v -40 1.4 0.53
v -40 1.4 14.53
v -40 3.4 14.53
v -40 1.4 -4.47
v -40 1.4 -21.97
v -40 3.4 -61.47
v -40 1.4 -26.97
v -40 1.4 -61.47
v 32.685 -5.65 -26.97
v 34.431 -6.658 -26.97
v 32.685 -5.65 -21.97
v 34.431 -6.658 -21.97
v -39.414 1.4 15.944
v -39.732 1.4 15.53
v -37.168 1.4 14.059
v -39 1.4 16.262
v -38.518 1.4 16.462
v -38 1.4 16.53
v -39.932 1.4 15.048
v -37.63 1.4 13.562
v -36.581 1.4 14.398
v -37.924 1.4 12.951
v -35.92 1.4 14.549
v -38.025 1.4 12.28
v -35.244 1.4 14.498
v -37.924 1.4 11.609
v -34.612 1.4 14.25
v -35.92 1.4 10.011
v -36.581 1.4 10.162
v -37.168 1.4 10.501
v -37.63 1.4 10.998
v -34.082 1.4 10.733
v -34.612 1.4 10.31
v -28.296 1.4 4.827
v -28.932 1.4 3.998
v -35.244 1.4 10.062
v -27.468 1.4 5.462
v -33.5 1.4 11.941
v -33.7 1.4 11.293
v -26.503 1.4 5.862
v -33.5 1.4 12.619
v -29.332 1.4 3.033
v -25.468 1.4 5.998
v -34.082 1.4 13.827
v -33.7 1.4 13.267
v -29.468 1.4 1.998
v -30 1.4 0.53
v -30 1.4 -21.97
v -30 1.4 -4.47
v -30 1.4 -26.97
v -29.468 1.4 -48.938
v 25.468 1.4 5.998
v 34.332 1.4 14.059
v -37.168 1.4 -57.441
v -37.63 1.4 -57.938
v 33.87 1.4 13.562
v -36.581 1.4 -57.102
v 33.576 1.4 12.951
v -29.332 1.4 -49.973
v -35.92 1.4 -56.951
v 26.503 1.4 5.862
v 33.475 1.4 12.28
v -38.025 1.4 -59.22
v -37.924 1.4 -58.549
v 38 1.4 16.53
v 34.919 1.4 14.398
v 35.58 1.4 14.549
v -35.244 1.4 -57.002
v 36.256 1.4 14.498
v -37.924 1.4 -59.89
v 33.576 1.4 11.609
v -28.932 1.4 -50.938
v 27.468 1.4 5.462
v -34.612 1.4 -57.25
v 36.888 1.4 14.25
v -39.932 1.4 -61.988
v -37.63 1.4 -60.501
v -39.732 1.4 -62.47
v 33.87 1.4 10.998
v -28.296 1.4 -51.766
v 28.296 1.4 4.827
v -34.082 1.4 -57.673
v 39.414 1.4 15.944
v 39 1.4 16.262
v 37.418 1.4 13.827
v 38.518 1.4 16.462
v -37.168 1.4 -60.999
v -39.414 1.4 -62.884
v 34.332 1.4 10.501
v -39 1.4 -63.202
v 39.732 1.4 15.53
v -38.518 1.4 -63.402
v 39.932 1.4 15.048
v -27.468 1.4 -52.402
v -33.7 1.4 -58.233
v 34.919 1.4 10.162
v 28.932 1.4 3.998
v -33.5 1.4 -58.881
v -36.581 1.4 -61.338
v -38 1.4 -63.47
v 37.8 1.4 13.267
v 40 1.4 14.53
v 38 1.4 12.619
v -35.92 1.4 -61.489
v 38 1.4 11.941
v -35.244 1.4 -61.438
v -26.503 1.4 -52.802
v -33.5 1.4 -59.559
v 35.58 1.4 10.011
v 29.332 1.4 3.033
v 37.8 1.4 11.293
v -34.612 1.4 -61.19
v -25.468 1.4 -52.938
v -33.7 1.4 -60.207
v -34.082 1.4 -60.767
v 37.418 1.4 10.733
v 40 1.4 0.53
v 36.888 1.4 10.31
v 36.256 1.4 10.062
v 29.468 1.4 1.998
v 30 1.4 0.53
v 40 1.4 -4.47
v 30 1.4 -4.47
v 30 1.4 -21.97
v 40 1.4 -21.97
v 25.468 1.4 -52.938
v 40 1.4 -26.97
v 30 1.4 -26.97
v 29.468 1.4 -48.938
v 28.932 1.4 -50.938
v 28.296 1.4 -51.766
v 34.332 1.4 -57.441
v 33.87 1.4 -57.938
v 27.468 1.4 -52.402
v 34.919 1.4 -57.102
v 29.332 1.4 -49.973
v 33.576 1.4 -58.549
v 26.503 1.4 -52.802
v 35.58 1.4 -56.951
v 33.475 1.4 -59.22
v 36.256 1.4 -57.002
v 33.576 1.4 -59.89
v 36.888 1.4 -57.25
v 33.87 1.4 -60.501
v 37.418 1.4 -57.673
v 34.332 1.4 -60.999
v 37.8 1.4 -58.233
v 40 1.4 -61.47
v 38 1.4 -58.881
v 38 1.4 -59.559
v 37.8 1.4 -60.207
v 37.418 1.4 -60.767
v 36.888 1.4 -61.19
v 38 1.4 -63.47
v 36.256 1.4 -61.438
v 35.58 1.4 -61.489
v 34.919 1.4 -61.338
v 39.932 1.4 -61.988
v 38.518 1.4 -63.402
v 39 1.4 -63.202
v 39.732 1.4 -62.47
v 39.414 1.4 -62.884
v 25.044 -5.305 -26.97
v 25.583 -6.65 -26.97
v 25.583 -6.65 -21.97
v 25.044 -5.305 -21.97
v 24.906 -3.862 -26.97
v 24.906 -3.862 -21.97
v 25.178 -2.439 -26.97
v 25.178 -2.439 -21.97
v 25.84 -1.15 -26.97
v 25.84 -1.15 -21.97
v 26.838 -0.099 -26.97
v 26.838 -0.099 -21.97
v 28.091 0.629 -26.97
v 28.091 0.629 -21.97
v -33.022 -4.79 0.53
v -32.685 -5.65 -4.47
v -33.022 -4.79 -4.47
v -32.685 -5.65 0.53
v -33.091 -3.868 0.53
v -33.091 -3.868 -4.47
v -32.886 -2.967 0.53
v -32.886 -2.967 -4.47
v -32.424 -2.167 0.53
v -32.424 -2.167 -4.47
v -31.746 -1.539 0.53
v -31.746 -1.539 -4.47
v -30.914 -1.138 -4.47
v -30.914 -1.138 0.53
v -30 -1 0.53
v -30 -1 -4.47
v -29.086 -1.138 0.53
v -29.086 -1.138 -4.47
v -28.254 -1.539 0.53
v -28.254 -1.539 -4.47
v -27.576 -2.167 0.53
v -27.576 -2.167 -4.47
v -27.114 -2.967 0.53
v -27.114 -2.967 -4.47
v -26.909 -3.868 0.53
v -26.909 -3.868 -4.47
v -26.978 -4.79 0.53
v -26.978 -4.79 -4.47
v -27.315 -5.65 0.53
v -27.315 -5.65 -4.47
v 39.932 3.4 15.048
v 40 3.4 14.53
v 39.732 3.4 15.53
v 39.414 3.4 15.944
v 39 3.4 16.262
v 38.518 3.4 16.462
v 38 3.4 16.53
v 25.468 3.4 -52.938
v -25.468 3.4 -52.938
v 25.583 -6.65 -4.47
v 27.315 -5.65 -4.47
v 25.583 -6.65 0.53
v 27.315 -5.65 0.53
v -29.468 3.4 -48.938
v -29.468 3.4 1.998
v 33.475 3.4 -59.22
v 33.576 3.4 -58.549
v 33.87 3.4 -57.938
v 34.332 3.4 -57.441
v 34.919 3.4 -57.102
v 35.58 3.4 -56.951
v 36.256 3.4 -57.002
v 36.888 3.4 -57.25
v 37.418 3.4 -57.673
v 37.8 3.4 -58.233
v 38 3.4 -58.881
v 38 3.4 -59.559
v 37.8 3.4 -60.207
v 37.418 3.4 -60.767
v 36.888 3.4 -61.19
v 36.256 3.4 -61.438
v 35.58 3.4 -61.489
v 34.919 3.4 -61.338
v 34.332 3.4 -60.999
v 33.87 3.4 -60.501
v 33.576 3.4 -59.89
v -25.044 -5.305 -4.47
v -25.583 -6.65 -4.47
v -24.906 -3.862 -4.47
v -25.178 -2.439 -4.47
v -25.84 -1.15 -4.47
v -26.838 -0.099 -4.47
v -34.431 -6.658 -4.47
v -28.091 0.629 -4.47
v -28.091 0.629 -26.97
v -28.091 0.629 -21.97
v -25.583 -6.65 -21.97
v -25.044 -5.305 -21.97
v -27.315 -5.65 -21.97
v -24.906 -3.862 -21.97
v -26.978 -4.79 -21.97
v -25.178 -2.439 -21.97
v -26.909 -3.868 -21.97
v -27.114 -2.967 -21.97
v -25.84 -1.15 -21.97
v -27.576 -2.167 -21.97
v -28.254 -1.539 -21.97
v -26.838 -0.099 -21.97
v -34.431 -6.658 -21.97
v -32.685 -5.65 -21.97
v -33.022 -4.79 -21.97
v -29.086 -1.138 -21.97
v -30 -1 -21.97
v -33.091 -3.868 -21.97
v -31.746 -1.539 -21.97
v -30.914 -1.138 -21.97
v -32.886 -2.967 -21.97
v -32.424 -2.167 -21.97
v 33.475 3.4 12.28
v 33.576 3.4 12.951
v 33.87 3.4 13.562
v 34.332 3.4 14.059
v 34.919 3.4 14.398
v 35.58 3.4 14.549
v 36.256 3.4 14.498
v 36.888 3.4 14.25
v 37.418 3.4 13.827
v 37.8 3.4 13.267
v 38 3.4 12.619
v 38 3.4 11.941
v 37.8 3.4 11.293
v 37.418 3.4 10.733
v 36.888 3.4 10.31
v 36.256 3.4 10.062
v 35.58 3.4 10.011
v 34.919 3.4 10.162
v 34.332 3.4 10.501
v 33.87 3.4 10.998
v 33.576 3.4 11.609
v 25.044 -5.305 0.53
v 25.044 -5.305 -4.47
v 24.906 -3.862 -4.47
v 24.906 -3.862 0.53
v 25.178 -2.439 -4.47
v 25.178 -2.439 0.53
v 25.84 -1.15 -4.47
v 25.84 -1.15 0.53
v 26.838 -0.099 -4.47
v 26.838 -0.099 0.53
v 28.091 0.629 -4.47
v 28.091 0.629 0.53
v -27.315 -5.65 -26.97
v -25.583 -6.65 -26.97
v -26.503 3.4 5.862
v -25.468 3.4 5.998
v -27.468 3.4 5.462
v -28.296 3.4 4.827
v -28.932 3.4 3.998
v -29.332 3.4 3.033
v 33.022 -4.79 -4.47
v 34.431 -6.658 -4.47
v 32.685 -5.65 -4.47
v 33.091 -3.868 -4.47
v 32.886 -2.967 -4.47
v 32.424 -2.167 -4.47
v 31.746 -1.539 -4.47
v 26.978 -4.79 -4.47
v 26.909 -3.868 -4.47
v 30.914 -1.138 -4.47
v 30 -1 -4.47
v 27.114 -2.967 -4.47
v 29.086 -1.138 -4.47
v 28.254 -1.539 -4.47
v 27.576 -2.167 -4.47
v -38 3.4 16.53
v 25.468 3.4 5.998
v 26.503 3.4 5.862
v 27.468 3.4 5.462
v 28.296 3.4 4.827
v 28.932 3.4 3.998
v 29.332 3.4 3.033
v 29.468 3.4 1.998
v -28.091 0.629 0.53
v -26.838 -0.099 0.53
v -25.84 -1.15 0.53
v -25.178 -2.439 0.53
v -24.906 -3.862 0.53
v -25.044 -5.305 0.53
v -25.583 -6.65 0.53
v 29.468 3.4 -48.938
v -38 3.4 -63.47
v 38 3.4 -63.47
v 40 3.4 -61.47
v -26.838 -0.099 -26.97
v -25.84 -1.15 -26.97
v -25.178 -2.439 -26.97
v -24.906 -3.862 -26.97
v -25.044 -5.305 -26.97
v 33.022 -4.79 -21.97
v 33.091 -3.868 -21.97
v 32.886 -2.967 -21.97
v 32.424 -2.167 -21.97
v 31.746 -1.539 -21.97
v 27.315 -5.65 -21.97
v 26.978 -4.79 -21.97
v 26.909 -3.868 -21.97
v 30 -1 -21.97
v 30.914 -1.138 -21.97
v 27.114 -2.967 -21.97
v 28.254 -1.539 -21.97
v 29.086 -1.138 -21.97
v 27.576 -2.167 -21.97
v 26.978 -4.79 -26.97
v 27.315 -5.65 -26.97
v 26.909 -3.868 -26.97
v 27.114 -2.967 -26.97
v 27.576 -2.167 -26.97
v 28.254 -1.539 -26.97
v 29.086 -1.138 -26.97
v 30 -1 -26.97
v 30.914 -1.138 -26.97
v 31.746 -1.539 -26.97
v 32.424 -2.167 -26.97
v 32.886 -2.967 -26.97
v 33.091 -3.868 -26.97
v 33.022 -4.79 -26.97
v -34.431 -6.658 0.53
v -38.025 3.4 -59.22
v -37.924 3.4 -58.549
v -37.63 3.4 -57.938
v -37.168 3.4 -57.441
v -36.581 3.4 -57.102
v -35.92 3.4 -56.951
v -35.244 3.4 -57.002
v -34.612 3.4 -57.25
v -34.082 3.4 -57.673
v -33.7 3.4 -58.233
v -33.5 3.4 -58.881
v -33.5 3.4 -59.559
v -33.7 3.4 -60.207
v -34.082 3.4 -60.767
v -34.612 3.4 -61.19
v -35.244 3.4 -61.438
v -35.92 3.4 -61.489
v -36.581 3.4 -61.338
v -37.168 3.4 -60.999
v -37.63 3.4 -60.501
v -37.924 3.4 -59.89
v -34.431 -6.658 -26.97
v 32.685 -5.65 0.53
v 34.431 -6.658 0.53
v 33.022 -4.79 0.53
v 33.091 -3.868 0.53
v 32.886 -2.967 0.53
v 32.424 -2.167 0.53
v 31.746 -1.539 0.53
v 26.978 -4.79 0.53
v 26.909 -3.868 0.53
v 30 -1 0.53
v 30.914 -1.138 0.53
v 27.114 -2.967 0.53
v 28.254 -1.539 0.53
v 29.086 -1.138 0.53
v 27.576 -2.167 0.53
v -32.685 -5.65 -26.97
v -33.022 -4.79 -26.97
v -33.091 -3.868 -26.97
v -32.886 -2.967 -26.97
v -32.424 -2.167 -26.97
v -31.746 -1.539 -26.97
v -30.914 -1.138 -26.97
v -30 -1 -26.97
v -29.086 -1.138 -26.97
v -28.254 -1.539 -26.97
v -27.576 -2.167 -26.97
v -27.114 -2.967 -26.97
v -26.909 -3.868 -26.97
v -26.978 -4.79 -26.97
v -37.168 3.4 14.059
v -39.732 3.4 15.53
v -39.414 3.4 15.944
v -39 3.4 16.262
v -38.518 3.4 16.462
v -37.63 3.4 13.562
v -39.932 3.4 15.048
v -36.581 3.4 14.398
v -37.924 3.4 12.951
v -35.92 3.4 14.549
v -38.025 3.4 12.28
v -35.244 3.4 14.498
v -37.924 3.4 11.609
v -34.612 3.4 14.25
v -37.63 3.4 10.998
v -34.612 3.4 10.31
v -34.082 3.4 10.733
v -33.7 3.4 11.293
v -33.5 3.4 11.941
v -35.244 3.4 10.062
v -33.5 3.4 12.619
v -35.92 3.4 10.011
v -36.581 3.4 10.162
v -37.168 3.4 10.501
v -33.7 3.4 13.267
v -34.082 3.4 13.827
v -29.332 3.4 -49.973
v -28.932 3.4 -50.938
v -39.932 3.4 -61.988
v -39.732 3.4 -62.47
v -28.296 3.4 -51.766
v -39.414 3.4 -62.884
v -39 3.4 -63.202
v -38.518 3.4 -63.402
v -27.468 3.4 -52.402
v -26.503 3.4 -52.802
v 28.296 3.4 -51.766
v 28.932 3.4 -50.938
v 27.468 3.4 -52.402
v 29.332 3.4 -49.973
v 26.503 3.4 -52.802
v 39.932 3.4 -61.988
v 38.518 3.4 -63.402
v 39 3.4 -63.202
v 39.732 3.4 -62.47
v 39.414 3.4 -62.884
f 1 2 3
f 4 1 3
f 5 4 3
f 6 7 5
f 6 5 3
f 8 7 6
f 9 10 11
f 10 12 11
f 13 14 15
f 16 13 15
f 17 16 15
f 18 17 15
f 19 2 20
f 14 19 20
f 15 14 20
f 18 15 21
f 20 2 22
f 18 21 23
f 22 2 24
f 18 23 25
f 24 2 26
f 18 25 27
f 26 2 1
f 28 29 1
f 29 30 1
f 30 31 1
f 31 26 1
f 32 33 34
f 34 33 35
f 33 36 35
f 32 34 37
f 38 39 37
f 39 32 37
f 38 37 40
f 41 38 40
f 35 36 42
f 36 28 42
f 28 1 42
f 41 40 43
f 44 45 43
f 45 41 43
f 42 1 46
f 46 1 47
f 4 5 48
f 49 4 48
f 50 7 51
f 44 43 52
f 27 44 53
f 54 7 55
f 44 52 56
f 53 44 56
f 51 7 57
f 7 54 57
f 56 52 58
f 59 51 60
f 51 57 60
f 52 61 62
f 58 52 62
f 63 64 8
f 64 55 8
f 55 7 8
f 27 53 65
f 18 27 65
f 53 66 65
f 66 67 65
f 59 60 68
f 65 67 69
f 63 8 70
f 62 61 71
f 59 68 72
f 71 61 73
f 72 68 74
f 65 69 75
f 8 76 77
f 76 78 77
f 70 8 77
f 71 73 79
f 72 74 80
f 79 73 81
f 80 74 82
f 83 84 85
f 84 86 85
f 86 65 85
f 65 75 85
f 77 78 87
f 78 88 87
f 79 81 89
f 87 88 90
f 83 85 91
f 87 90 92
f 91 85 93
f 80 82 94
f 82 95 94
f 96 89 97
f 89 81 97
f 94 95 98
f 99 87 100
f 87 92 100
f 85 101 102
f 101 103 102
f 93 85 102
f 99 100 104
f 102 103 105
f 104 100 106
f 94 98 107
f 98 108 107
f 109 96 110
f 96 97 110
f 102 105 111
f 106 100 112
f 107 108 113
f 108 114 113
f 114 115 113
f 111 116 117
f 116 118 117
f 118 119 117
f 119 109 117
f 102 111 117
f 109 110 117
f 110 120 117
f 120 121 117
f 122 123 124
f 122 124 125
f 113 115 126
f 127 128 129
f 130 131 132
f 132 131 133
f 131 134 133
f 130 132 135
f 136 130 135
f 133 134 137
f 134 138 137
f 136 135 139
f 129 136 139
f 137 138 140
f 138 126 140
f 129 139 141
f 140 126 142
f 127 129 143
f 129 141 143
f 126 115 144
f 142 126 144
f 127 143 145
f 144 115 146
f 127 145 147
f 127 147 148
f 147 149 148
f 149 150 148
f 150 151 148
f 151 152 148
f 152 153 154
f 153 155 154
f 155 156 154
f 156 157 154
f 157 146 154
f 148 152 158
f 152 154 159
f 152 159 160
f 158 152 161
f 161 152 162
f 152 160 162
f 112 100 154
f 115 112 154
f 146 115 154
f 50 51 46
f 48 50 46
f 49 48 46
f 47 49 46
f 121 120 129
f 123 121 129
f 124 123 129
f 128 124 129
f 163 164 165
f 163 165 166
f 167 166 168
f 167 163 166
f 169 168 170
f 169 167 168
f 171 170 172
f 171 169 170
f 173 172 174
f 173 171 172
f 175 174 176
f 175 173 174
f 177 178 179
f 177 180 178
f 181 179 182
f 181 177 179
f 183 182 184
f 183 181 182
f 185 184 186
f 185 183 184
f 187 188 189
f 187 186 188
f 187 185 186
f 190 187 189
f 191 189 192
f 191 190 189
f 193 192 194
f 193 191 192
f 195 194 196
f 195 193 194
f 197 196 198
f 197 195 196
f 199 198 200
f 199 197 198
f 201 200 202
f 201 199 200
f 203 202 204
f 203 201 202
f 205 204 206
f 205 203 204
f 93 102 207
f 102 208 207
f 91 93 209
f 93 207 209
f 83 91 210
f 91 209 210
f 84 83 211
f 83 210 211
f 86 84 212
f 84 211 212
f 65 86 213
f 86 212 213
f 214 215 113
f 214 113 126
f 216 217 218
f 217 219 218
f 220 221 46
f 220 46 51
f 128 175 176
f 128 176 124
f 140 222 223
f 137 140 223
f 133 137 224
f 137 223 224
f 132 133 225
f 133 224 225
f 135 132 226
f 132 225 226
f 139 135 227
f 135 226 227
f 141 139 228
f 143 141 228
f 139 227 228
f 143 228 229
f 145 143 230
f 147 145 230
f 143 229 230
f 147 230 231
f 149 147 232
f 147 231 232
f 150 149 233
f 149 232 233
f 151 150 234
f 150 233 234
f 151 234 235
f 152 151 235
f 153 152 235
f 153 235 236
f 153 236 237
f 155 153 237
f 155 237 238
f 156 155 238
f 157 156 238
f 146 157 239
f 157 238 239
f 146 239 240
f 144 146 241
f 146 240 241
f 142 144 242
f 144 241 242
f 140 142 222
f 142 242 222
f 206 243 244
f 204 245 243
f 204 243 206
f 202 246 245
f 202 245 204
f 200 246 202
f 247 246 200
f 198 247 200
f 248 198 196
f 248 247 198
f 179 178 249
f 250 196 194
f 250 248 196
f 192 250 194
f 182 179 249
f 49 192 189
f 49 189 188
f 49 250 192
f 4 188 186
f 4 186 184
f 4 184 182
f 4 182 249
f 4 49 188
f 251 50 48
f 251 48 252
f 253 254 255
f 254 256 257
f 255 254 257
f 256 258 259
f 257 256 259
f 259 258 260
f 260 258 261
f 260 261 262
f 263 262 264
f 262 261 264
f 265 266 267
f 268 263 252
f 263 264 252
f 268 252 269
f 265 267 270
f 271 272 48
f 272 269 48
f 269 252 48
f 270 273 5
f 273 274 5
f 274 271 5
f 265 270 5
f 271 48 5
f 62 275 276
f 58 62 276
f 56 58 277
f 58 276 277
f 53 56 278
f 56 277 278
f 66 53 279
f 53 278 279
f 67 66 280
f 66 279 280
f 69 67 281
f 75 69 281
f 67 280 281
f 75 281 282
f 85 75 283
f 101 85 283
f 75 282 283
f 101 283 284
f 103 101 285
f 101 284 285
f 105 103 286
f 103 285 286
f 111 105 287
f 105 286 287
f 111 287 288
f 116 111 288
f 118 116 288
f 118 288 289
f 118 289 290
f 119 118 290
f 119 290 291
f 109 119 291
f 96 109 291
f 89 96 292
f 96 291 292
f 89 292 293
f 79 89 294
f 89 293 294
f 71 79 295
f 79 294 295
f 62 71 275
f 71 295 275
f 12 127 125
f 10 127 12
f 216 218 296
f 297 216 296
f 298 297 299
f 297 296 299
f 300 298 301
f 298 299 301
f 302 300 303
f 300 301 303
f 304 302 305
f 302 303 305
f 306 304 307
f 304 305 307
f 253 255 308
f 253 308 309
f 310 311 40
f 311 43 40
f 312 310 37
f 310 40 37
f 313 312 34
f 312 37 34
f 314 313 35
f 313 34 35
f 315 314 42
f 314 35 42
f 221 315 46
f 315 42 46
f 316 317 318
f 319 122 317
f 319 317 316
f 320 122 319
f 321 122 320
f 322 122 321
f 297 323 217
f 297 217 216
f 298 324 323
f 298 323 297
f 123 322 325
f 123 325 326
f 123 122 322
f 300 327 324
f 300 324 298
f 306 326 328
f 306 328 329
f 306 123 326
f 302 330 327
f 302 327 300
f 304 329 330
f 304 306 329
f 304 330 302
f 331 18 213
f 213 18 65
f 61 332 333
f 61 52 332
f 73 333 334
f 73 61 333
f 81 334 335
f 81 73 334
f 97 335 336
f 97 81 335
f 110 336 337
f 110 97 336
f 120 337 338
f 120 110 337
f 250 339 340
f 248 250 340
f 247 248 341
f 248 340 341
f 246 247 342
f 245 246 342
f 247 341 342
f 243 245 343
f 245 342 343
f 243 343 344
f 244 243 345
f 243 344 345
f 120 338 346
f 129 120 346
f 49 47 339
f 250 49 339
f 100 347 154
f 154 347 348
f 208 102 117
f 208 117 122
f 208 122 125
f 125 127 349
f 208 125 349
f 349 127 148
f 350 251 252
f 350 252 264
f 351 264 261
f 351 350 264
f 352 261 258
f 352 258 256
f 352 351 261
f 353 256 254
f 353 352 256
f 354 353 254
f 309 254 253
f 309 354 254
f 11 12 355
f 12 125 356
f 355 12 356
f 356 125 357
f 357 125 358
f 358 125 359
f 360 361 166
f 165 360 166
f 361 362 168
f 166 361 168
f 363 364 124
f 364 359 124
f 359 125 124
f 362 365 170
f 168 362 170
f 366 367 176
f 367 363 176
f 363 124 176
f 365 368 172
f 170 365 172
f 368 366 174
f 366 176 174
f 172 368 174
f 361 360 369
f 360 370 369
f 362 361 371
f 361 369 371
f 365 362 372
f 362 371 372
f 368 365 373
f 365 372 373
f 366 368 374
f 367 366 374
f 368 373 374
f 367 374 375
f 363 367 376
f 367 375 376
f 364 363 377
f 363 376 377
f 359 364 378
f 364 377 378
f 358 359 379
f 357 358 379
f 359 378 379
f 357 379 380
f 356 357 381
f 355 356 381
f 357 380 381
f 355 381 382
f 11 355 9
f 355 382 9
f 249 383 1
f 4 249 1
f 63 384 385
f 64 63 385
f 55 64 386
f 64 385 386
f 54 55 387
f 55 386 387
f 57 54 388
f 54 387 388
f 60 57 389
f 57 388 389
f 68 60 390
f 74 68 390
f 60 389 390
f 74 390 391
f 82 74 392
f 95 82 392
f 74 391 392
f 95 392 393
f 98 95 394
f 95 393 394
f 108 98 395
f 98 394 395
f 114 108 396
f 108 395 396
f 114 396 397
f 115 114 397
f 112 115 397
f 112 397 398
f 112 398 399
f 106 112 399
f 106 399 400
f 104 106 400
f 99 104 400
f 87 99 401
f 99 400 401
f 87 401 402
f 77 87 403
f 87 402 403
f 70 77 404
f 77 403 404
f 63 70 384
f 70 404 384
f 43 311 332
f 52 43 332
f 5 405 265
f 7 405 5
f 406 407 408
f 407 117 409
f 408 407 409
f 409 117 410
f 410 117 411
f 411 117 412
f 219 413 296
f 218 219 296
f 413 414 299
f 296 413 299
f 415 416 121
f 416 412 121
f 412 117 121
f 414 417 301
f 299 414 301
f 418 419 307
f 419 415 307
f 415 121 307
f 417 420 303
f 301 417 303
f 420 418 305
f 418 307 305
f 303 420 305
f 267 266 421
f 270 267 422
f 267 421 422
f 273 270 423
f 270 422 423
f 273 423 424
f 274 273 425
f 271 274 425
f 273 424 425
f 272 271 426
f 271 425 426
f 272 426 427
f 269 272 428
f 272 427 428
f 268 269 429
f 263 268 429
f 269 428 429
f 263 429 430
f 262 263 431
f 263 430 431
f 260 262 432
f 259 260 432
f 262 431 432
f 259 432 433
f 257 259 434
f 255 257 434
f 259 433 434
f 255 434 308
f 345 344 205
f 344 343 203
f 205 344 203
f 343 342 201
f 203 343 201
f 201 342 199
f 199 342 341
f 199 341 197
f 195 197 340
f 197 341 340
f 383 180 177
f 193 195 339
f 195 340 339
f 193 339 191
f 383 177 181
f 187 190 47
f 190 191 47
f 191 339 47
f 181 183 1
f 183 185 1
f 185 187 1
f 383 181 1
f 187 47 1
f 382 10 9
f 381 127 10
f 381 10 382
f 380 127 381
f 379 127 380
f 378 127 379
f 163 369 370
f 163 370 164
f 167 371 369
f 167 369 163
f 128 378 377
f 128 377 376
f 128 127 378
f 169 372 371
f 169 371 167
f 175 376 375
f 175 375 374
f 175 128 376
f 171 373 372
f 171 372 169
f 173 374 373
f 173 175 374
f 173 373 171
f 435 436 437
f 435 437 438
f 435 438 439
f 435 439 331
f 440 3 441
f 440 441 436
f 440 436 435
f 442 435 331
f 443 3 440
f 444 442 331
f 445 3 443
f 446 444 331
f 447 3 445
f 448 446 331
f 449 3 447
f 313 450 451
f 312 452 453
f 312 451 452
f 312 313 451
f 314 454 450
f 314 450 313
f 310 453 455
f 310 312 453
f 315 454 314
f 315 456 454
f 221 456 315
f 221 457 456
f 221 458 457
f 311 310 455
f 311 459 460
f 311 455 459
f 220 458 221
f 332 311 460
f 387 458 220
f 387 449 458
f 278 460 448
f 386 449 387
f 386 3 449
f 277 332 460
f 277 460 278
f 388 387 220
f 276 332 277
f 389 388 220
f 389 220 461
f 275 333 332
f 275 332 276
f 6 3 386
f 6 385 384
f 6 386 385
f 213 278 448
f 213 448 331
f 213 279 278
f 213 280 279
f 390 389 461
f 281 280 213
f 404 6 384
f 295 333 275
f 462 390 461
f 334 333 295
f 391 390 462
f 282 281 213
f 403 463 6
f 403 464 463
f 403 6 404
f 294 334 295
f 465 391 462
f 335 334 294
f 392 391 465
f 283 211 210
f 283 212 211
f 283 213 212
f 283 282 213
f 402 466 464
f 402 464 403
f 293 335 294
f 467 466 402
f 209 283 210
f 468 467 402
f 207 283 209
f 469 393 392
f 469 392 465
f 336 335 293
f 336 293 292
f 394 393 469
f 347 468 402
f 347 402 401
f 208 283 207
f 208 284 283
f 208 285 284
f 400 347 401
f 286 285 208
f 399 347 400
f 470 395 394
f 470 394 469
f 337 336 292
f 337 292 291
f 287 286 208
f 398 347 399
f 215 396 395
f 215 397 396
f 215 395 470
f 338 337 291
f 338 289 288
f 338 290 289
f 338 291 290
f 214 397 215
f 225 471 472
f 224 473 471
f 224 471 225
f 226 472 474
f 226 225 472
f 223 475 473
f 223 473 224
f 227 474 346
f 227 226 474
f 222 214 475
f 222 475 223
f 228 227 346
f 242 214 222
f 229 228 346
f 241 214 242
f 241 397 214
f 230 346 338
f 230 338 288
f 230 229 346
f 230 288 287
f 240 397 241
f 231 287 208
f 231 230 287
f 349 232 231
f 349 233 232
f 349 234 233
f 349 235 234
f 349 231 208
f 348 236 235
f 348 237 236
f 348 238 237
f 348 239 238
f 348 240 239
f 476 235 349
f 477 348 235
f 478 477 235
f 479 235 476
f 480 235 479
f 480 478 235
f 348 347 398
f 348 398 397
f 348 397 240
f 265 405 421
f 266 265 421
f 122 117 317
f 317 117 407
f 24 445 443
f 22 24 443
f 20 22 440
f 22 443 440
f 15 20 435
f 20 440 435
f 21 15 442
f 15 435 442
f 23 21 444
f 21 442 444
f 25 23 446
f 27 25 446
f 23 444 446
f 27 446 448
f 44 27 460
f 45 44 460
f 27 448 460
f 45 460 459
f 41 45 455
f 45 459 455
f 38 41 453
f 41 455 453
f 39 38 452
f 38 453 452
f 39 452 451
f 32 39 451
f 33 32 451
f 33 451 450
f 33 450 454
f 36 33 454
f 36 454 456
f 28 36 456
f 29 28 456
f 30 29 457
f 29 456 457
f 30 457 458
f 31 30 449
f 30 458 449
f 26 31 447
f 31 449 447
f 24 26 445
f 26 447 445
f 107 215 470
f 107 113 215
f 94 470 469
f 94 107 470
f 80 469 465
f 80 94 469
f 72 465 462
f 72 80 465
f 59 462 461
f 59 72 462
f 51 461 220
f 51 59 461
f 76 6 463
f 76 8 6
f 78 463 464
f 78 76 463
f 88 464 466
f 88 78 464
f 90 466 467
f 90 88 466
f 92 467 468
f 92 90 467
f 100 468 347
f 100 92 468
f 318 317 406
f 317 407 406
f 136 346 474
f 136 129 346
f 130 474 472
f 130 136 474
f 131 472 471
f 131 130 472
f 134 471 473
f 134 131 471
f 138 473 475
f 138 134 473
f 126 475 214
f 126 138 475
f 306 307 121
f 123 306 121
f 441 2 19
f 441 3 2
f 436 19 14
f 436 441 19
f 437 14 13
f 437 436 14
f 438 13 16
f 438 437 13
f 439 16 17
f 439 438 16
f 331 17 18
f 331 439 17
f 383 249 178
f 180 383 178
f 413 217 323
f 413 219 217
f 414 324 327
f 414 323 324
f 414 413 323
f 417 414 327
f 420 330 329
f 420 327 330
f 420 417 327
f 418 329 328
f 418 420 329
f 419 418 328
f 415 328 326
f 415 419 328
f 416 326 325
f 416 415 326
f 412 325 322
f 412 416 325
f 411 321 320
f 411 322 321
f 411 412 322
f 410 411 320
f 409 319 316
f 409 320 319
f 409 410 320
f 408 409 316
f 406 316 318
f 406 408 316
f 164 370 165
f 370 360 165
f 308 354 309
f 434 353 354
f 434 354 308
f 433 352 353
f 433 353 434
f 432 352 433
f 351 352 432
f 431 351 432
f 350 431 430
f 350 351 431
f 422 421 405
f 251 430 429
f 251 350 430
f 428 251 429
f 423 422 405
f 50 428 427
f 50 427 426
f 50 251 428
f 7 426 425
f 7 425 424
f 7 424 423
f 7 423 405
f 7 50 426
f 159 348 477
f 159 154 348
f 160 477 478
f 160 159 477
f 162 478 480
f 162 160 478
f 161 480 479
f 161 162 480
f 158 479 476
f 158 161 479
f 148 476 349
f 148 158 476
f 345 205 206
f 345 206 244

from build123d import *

# Parameters (mm, degrees)
SKETCH1_W               = 80
SKETCH1_H               = 57.5
BOSS_EXTRUDE1_DEPTH     = 8
BOSS_EXTRUDE2_START     = -10
SKETCH3_R               = 3.1
BOSS_EXTRUDE2_DEPTH     = 5
CUT_EXTRUDE1_DEPTH      = 10
CUT_EXTRUDE1_DEPTH_BACK = 63
MOVE_FACE1_BY           = 6
SKETCH5_W               = 80
SKETCH5_H               = 79.999909439
BOSS_EXTRUDE3_DEPTH     = 2
FILLET1_R               = 2
SKETCH6_R               = 2.275
CUT_EXTRUDE2_DEPTH      = 2
SKETCH7_W               = 58.936081431
SKETCH7_H               = 58.936081431
CUT_EXTRUDE3_DEPTH      = 2
FILLET2_R               = 4


with BuildPart() as part:
    # Sketch1 → Boss-Extrude1 (new body)
    with BuildSketch(Plane(origin=(0, 1.4, 0), x_dir=(1, 0, 0), z_dir=(0, 1, 0))):
        with Locations((0, 12.22)):
            Rectangle(SKETCH1_W, SKETCH1_H)
    extrude(amount=BOSS_EXTRUDE1_DEPTH)

    # Sketch3 → Boss-Extrude2 (add)
    # profile 1 of 2: a face of its own
    with BuildSketch(Plane(origin=(0, 0, -36.97), x_dir=(-1, 0, 0), z_dir=(0, 0, -1)).offset(BOSS_EXTRUDE2_START)):
        with BuildLine():
            Line((-30, 1.4), (-40, 1.4))
            Line((-40, 1.4), (-34.195661174, -6.999383953))
            ThreePointArc((-34.195661174, -6.999383953), (-26.018142719, -7.286661669), (-28.090628592, 0.629090909))
            Line((-28.090628592, 0.629090909), (-30, 1.4))
        make_face()
        with Locations((-30, -4.1)):
            Circle(SKETCH3_R, mode=Mode.SUBTRACT)
    # profile 2 of 2: a face of its own
    with BuildSketch(Plane(origin=(0, 0, -36.97), x_dir=(-1, 0, 0), z_dir=(0, 0, -1)).offset(BOSS_EXTRUDE2_START)):
        with BuildLine():
            Line((34.195661174, -6.999383953), (40, 1.4))
            Line((40, 1.4), (30, 1.4))
            Line((30, 1.4), (28.090628592, 0.629090909))
            ThreePointArc((28.090628592, 0.629090909), (26.018142719, -7.286661669), (34.195661174, -6.999383953))
        make_face()
        with Locations((30, -4.1)):
            Circle(SKETCH3_R, mode=Mode.SUBTRACT)
    boss_extrude2 = extrude(amount=-BOSS_EXTRUDE2_DEPTH)

    # Mirror1: Boss-Extrude2 across plane
    add(boss_extrude2.mirror(Plane.XY.offset(-13.22)))

    # Sketch4 → Cut-Extrude1 (cut, two sides: drawn at the far end of the back side and taken through both)
    with BuildSketch(Plane(origin=(0, 0, -21.97), x_dir=(-1, 0, 0), z_dir=(0, 0, -1)).offset(-CUT_EXTRUDE1_DEPTH_BACK)):
        Polygon((-30, -4.1), (-20, -9.873502692), (-40, -9.873502692), align=None)
        Polygon((20, -9.873502692), (40, -9.873502692), (30, -4.1), align=None)
    extrude(amount=CUT_EXTRUDE1_DEPTH + CUT_EXTRUDE1_DEPTH_BACK, mode=Mode.SUBTRACT)

    # Move Face1: a face moved inward by 6.0
    extrude(part.faces().sort_by_distance((0, 9.4, -12.22))[0], amount=MOVE_FACE1_BY, dir=(0, -1, 0), mode=Mode.SUBTRACT)

    # Sketch5 → Boss-Extrude3 (add)
    with BuildSketch(Plane(origin=(0, 3.4, 0), x_dir=(1, 0, 0), z_dir=(0, 1, 0))):
        with Locations((0, 23.46995472)):
            Rectangle(SKETCH5_W, SKETCH5_H)
    extrude(amount=-BOSS_EXTRUDE3_DEPTH)

    # Fillet1
    fillet1_edges = [part.edges().sort_by_distance(p)[0] for p in [
        (-40, 2.4, 16.53),
        (40, 2.4, 16.53),
        (-40, 2.4, -63.469909439),
        (40, 2.4, -63.469909439),
    ]]
    fillet(fillet1_edges, radius=FILLET1_R)

    # Sketch6 → Cut-Extrude2 (cut)
    with BuildSketch(Plane(origin=(0, 3.4, 0), x_dir=(1, 0, 0), z_dir=(0, 1, 0))):
        with Locations((35.75, 59.219909439)):
            Circle(SKETCH6_R)
        with Locations((35.75, -12.280045281)):
            Circle(SKETCH6_R)
        with Locations((-35.74995472, 59.219909439)):
            Circle(SKETCH6_R)
        with Locations((-35.74995472, -12.280045281)):
            Circle(SKETCH6_R)
    extrude(amount=-CUT_EXTRUDE2_DEPTH, mode=Mode.SUBTRACT)

    # Sketch7 → Cut-Extrude3 (cut)
    with BuildSketch(Plane(origin=(0, 3.4, 0), x_dir=(1, 0, 0), z_dir=(0, 1, 0))):
        with Locations((2.264e-05, 23.469932079)):
            Rectangle(SKETCH7_W, SKETCH7_H)
    extrude(amount=-CUT_EXTRUDE3_DEPTH, mode=Mode.SUBTRACT)

    # Fillet2
    fillet2_edges = [part.edges().sort_by_distance(p)[0] for p in [
        (29.468063356, 2.4, -52.937972794),
        (29.468063356, 2.4, 5.998108637),
        (-29.468018075, 2.4, 5.998108637),
        (-29.468018075, 2.4, -52.937972794),
    ]]
    fillet(fillet2_edges, radius=FILLET2_R)


solid = part.part
